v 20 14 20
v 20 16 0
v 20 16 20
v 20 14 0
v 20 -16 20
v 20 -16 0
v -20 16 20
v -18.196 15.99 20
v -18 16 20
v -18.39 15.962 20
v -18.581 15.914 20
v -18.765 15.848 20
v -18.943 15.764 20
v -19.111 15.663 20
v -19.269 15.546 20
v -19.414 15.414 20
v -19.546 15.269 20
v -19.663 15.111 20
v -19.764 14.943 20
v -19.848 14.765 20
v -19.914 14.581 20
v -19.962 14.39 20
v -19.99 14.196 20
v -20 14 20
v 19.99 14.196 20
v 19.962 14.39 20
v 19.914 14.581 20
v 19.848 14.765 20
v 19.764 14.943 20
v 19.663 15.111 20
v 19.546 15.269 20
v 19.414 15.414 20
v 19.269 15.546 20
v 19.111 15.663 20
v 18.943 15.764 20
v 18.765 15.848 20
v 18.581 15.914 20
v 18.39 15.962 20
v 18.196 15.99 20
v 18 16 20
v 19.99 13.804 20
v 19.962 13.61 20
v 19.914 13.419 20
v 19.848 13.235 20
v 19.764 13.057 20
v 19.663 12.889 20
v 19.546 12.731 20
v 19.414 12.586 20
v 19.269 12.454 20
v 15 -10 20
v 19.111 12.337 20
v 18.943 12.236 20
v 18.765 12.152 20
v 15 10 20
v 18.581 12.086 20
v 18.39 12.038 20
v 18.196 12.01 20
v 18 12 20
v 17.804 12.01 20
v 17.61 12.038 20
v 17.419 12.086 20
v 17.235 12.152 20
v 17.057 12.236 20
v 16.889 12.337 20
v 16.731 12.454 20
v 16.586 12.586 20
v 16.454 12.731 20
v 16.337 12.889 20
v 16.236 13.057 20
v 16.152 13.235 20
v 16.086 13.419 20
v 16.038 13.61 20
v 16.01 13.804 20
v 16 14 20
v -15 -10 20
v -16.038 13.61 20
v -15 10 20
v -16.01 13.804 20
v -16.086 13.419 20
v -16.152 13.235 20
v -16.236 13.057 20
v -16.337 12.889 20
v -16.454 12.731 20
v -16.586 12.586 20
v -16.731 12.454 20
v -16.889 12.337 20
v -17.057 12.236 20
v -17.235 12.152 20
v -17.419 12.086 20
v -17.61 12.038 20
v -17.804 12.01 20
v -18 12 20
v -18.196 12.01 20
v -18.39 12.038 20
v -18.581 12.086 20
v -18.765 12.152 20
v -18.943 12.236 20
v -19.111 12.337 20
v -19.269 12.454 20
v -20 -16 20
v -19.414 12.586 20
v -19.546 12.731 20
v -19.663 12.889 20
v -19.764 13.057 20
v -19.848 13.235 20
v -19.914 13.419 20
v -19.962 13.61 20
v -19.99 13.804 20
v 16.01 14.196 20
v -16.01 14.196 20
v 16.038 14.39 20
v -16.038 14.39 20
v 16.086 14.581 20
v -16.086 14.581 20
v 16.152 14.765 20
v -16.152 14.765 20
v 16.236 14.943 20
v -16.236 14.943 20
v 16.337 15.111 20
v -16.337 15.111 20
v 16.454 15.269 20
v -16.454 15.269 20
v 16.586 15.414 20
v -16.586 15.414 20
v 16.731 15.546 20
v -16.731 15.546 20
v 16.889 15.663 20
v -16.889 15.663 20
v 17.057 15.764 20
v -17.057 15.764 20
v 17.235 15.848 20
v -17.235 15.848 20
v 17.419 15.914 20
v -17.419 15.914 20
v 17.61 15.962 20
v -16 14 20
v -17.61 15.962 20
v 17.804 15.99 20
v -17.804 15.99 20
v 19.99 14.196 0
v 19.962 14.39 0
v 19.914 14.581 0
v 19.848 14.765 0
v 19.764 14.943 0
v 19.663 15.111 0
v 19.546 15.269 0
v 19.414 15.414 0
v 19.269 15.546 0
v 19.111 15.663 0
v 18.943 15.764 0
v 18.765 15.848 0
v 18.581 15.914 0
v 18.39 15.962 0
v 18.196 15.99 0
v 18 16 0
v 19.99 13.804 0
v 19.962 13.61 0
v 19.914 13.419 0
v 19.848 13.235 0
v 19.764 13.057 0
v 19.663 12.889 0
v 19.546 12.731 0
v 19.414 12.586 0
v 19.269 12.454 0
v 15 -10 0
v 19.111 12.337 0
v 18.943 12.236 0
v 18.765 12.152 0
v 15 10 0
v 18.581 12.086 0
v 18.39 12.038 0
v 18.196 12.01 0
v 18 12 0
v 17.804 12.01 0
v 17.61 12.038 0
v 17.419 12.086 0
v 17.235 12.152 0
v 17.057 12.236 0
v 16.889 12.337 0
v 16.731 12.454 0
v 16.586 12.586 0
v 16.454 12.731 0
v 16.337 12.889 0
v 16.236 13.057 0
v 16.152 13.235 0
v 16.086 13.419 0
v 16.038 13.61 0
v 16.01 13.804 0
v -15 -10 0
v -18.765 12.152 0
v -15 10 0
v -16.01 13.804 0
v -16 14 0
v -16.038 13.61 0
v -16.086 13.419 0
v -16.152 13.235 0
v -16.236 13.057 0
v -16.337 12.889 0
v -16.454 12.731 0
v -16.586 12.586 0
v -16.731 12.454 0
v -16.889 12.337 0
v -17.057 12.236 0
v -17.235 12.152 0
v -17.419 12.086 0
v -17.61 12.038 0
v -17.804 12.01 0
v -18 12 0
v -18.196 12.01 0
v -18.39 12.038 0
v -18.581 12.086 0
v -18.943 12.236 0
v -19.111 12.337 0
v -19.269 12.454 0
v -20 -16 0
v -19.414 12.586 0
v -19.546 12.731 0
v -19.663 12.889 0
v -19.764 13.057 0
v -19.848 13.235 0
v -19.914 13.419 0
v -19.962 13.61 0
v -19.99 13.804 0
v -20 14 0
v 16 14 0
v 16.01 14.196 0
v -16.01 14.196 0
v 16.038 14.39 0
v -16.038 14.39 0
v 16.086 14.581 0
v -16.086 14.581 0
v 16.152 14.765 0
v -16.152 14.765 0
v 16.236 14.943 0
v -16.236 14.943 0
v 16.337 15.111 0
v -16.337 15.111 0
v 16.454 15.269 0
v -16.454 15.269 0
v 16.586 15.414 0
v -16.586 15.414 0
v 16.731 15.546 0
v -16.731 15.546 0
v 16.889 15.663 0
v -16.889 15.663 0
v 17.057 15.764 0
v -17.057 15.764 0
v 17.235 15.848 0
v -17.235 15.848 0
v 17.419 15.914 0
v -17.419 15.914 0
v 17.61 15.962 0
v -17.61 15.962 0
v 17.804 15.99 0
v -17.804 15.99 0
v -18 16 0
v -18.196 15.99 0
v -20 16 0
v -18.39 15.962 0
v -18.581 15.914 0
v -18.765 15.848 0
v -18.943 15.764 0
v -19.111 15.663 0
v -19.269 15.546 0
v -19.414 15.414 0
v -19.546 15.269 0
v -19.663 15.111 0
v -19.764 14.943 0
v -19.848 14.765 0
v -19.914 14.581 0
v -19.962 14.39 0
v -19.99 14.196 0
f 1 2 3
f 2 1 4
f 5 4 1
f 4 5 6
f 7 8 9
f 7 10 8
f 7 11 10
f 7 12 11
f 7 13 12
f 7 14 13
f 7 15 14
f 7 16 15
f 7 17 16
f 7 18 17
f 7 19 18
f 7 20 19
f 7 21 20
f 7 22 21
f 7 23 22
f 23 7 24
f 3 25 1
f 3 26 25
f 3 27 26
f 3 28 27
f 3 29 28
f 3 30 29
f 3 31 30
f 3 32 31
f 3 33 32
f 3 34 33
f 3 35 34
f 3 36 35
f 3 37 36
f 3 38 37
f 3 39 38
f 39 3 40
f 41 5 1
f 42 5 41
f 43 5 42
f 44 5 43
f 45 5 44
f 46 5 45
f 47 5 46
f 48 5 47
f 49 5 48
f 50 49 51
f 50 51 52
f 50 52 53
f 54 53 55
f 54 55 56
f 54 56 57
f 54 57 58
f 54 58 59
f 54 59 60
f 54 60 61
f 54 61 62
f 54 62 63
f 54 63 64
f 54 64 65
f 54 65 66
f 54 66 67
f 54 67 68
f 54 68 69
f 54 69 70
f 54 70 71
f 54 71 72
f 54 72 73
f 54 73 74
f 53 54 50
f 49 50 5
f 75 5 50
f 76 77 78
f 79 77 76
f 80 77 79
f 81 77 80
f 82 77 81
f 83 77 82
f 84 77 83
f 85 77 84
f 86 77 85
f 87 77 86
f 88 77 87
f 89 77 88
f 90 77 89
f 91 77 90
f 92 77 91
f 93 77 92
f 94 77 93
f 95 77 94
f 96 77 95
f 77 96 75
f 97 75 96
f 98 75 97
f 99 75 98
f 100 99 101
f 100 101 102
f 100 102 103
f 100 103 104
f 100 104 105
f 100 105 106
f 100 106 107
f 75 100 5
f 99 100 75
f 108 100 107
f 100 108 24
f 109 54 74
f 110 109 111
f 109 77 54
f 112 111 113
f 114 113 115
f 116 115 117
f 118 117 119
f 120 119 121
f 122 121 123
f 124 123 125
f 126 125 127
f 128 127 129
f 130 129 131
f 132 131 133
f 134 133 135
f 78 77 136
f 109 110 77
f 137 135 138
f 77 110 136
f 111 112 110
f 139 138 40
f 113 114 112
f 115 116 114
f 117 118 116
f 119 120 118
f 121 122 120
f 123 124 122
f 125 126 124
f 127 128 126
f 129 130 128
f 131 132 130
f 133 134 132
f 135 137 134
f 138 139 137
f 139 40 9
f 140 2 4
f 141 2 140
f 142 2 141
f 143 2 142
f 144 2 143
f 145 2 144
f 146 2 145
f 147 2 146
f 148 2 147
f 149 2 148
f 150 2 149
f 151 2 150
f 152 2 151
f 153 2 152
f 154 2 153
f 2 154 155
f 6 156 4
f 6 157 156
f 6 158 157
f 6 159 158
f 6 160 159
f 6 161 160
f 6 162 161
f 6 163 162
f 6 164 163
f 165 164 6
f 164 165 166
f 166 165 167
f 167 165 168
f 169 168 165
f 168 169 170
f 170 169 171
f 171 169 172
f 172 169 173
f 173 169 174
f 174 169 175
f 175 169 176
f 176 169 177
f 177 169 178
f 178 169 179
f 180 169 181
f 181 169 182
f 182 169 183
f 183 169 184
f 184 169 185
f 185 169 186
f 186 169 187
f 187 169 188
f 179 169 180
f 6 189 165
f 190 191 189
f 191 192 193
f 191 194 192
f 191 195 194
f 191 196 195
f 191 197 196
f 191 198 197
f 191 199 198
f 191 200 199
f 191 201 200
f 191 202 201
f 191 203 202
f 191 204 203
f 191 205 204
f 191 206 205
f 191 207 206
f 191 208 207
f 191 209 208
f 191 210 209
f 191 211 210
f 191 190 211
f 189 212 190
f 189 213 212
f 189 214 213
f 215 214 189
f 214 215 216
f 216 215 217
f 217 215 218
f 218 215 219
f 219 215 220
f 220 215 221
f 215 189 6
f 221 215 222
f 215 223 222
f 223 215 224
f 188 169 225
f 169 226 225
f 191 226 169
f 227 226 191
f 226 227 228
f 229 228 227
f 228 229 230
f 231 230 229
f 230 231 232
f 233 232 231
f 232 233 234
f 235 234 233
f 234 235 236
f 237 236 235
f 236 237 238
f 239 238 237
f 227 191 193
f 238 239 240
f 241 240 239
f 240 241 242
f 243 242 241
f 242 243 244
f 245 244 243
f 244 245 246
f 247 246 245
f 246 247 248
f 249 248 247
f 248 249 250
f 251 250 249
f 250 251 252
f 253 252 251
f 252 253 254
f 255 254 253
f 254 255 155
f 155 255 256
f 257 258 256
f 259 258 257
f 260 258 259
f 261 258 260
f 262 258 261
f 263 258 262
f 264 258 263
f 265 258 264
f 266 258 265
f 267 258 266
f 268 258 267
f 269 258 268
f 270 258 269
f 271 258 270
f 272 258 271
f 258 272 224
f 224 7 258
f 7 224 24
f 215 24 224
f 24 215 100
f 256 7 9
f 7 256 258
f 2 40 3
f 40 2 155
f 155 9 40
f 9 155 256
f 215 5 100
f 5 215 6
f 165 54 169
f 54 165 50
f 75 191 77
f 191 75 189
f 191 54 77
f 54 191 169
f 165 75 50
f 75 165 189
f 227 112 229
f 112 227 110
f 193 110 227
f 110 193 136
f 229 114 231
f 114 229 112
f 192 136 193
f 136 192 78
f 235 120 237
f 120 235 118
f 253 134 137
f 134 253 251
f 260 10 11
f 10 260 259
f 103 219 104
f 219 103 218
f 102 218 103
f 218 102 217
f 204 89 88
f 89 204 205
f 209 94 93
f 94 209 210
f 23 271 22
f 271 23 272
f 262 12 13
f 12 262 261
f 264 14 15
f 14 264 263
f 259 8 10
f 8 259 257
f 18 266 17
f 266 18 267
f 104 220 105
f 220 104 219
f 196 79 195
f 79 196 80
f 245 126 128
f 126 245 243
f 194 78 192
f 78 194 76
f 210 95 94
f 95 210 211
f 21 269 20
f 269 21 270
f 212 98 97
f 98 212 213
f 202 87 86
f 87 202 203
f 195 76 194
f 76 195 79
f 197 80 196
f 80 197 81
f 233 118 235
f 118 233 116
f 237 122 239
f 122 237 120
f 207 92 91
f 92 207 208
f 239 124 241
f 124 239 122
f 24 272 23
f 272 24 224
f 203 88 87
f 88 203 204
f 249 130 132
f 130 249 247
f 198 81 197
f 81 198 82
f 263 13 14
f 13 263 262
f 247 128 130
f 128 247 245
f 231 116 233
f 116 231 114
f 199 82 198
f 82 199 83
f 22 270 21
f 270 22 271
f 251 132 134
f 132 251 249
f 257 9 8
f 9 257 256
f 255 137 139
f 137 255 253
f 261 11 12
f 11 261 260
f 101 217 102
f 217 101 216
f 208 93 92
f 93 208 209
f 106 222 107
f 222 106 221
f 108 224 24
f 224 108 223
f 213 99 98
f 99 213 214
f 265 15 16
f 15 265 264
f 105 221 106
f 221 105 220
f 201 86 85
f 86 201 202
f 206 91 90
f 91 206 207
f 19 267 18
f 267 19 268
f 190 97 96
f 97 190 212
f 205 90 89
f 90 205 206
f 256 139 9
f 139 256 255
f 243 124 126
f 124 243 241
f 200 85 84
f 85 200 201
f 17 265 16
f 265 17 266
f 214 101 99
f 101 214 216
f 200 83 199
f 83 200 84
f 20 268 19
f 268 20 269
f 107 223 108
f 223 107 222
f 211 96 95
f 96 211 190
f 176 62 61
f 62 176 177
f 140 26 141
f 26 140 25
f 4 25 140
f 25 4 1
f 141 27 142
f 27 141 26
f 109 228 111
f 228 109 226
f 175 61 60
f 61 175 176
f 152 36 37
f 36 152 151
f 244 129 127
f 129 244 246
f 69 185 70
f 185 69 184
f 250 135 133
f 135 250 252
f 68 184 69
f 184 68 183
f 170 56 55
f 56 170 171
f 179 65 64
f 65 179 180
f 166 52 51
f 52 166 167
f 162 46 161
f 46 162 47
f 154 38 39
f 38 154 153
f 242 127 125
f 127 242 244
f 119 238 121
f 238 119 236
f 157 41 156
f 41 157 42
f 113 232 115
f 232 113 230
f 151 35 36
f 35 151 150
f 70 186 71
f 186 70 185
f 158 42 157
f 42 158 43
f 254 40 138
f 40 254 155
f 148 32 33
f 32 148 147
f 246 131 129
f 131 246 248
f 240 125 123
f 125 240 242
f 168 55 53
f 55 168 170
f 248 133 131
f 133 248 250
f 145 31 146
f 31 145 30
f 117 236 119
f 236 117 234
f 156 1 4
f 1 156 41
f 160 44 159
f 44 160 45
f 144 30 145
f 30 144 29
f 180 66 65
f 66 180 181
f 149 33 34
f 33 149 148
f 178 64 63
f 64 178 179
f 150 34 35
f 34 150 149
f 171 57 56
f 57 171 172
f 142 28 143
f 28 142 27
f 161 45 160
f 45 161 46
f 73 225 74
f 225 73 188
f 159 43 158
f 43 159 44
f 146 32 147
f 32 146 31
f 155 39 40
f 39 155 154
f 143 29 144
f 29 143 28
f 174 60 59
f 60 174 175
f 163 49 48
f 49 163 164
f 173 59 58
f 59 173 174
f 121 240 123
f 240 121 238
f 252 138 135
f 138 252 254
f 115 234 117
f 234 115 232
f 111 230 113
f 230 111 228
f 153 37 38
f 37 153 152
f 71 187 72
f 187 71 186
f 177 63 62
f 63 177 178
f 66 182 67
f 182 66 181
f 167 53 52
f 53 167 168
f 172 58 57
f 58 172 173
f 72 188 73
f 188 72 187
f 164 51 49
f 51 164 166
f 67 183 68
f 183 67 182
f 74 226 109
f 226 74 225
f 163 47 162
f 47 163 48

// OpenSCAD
module iec_power_inlet() {
    difference() {
        // Main body
        cube([40, 32, 20], center = true);
        
        // Cutout for the inlet
        translate([-15, -10, -10])
            cube([30, 20, 20], center = false);
        
        // Holes for mounting
        translate([-18, 14, 0])
            cylinder(h = 20, r = 2, center = true, $fn = 64);
        translate([18, 14, 0])
            cylinder(h = 20, r = 2, center = true, $fn = 64);
    }
}

translate([0, 0, 10])
    iec_power_inlet();
